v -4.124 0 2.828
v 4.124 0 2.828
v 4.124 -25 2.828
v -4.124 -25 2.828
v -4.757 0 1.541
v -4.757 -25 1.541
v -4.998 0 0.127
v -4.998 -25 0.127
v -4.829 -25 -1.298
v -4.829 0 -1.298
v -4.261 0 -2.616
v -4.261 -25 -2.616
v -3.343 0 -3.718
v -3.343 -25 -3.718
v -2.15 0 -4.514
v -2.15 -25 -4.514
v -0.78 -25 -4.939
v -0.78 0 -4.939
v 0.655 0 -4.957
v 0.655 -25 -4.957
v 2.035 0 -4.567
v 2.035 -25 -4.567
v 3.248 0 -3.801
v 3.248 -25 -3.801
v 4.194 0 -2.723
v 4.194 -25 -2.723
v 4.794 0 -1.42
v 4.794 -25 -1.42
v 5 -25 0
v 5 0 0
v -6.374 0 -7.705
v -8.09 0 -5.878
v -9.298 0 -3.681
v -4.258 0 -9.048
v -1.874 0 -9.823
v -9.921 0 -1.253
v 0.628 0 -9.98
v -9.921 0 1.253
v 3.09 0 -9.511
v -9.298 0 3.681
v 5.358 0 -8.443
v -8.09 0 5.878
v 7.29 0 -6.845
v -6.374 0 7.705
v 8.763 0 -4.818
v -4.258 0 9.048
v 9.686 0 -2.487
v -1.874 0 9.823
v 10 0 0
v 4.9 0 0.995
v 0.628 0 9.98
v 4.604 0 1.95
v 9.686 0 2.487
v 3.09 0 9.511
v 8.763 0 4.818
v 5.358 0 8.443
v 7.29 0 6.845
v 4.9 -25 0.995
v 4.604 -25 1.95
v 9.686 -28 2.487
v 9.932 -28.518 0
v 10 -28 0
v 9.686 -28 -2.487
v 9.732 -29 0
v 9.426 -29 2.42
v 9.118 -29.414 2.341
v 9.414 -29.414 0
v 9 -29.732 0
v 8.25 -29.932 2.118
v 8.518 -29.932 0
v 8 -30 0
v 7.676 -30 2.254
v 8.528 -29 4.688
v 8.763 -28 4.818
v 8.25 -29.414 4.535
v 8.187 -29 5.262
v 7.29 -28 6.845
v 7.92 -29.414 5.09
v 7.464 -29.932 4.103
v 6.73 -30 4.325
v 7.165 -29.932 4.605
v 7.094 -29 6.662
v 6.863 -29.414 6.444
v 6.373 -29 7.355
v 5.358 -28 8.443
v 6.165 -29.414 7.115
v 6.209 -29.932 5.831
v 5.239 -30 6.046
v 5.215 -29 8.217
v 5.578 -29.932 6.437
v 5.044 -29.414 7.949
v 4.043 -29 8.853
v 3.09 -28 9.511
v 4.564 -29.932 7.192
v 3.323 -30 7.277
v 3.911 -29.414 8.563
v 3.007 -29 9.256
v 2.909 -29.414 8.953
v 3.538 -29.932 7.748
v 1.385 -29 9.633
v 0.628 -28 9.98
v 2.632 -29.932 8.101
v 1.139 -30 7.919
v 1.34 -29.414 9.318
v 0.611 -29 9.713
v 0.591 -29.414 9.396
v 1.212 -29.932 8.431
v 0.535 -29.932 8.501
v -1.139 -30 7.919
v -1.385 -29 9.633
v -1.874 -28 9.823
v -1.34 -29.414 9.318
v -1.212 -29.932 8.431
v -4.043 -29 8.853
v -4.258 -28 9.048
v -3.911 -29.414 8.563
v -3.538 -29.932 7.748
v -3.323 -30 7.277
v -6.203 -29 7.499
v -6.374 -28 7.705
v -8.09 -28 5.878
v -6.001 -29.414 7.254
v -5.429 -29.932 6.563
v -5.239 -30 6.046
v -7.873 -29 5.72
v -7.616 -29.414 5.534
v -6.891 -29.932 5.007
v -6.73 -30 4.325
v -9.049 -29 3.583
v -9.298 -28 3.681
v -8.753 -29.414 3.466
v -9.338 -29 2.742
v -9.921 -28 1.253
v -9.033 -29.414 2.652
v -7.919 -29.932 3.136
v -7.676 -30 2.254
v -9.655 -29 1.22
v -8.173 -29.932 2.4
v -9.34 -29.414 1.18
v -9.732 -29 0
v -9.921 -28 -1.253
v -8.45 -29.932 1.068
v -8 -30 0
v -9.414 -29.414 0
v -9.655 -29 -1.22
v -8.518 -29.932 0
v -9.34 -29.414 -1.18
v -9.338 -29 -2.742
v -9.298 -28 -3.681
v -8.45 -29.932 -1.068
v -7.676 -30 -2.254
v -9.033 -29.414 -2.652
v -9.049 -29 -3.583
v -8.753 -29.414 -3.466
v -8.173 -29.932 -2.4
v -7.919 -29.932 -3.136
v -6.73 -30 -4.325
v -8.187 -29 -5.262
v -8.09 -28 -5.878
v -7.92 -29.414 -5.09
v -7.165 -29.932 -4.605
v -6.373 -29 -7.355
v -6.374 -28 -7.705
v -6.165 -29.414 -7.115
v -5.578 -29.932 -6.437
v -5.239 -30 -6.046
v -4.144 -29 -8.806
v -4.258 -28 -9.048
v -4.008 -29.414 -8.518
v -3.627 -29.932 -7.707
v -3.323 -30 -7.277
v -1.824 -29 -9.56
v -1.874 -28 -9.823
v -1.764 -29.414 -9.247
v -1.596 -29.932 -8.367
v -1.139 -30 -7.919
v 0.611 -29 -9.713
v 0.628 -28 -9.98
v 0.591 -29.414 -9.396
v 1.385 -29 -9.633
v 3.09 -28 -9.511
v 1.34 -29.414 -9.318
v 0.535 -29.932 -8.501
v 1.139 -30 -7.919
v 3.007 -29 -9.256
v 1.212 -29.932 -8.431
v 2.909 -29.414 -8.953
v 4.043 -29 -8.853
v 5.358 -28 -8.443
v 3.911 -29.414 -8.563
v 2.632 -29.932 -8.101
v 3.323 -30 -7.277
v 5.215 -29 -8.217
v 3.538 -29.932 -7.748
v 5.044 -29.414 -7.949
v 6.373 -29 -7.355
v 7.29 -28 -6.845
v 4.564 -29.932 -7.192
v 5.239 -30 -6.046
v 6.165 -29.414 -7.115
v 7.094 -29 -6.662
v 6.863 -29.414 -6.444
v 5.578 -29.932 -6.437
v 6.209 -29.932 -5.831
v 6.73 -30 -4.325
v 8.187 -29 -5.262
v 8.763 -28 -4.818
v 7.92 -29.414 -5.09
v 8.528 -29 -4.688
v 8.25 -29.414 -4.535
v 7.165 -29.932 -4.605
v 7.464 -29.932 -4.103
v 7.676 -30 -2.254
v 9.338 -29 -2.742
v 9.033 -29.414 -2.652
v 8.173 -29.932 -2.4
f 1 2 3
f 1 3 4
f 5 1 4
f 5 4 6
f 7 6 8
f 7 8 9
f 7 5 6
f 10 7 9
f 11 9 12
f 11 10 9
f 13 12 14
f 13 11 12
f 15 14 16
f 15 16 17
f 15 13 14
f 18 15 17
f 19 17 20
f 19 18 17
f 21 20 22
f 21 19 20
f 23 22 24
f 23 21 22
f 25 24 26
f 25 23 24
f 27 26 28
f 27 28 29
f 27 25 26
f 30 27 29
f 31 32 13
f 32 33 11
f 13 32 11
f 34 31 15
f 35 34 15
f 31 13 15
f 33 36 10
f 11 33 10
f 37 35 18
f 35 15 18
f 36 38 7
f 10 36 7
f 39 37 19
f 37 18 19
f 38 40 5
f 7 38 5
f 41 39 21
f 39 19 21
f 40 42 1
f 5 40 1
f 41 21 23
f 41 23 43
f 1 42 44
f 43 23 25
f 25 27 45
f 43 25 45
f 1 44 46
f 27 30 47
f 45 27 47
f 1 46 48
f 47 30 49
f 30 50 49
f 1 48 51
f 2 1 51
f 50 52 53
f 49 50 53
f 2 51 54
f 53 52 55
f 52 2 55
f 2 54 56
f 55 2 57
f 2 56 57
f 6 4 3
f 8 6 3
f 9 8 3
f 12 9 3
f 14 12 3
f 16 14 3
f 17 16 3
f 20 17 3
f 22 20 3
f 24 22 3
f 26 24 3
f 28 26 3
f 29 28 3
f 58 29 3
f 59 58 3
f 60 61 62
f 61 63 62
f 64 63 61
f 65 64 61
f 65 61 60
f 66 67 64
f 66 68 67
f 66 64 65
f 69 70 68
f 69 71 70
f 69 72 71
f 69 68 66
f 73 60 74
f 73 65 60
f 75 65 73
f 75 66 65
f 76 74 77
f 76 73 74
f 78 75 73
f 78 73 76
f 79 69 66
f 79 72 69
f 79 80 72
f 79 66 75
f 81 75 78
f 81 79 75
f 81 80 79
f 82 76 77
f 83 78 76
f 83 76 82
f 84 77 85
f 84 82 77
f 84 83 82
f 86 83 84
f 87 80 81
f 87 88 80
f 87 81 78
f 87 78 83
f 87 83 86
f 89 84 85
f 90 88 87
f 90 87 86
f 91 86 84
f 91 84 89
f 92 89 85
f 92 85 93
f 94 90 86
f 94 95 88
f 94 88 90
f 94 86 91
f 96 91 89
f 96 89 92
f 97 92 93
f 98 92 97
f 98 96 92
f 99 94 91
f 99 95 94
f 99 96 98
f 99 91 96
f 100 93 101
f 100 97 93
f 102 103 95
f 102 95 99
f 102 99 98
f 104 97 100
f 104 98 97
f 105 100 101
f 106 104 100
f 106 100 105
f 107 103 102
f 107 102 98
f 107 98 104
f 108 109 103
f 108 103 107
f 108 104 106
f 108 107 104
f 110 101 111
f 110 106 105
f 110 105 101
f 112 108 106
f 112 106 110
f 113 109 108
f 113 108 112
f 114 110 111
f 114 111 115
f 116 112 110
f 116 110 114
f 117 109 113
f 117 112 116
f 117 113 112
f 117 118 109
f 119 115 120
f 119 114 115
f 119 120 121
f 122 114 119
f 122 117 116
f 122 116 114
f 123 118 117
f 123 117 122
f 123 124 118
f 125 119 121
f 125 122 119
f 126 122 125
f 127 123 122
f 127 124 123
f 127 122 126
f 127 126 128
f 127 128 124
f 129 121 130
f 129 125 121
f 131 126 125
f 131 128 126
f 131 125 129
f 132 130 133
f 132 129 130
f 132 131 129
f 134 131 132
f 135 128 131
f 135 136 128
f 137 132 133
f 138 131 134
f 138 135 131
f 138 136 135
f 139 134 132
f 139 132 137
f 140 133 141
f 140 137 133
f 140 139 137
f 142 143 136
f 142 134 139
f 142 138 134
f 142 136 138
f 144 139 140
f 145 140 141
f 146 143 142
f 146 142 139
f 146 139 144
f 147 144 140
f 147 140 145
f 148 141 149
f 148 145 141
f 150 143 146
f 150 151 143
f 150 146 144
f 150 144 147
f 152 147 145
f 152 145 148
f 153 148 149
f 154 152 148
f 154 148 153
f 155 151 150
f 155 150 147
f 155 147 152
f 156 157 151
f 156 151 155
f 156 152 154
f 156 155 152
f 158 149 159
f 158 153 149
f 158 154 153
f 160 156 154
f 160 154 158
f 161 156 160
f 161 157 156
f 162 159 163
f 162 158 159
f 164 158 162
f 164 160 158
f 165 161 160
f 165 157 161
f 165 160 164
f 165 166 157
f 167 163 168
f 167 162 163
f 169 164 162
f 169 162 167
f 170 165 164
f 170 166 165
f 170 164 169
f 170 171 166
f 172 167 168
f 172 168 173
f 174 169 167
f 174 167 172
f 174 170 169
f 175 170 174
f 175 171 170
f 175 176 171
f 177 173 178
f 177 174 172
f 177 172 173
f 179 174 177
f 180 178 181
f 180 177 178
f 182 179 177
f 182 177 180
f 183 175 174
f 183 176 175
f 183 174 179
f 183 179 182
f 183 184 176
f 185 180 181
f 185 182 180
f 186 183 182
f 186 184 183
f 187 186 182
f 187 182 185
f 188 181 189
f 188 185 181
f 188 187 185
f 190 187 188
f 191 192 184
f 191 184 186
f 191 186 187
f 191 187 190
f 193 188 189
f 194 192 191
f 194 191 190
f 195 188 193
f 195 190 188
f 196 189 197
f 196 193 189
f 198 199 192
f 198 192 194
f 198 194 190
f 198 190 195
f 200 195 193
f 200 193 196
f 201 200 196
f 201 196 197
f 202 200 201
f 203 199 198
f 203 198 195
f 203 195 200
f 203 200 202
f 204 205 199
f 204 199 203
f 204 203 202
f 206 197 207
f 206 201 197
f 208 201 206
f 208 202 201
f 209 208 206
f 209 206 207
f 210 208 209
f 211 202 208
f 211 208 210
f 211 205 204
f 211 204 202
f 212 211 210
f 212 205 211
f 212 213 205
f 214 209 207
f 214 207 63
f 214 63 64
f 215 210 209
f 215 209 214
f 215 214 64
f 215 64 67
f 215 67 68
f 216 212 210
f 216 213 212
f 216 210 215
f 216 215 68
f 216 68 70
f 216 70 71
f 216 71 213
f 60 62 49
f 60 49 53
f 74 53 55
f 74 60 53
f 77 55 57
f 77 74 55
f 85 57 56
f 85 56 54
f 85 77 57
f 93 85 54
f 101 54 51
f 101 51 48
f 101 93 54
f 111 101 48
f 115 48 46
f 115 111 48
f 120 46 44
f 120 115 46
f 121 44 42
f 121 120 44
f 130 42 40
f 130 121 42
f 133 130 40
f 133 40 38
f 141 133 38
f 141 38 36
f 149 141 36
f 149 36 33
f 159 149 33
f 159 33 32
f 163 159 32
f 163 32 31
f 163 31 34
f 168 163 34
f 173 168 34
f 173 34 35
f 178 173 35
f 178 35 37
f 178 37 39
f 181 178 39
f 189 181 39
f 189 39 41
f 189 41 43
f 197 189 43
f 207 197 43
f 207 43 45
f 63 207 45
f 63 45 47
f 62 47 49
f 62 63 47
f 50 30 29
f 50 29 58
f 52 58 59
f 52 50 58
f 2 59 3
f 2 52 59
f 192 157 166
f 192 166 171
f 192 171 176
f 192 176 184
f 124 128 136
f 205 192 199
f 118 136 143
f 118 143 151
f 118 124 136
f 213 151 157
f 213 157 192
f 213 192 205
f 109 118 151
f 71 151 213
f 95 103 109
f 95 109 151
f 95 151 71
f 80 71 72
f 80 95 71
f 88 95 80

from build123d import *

# Parameters (mm, degrees)
F2_R     = 10
F1_R     = 10
F4_R     = 2
F6_DEPTH = 25


with BuildPart() as f3:
    # F2 (on Front) → F3 section 0
    with BuildSketch(Plane.XZ):
        Circle(F2_R)
    # F1 (on offset) → F3 section 1
    with BuildSketch(Plane.XZ.offset(30)):
        Circle(F1_R)
    loft()

    # F4
    f4_edges = [f3.edges().sort_by_distance(p)[0] for p in [
        (-10, -30, 0),
    ]]
    fillet(f4_edges, radius=F4_R)

    # F5 (on Front) → F6 (cut)
    with BuildSketch(Plane.XZ):
        with BuildLine():
            ThreePointArc((-4.1235491527, 2.8277804697), (-1.4802456276, -4.7758635745), (5, 0))
            ThreePointArc((5, 0), (4.7758635745, 1.4802456276), (4.1235491527, 2.8277804697))
            Line((4.1235491527, 2.8277804697), (-4.1235491527, 2.8277804697))
        make_face()
    extrude(amount=F6_DEPTH, mode=Mode.SUBTRACT)


solid = f3.part
